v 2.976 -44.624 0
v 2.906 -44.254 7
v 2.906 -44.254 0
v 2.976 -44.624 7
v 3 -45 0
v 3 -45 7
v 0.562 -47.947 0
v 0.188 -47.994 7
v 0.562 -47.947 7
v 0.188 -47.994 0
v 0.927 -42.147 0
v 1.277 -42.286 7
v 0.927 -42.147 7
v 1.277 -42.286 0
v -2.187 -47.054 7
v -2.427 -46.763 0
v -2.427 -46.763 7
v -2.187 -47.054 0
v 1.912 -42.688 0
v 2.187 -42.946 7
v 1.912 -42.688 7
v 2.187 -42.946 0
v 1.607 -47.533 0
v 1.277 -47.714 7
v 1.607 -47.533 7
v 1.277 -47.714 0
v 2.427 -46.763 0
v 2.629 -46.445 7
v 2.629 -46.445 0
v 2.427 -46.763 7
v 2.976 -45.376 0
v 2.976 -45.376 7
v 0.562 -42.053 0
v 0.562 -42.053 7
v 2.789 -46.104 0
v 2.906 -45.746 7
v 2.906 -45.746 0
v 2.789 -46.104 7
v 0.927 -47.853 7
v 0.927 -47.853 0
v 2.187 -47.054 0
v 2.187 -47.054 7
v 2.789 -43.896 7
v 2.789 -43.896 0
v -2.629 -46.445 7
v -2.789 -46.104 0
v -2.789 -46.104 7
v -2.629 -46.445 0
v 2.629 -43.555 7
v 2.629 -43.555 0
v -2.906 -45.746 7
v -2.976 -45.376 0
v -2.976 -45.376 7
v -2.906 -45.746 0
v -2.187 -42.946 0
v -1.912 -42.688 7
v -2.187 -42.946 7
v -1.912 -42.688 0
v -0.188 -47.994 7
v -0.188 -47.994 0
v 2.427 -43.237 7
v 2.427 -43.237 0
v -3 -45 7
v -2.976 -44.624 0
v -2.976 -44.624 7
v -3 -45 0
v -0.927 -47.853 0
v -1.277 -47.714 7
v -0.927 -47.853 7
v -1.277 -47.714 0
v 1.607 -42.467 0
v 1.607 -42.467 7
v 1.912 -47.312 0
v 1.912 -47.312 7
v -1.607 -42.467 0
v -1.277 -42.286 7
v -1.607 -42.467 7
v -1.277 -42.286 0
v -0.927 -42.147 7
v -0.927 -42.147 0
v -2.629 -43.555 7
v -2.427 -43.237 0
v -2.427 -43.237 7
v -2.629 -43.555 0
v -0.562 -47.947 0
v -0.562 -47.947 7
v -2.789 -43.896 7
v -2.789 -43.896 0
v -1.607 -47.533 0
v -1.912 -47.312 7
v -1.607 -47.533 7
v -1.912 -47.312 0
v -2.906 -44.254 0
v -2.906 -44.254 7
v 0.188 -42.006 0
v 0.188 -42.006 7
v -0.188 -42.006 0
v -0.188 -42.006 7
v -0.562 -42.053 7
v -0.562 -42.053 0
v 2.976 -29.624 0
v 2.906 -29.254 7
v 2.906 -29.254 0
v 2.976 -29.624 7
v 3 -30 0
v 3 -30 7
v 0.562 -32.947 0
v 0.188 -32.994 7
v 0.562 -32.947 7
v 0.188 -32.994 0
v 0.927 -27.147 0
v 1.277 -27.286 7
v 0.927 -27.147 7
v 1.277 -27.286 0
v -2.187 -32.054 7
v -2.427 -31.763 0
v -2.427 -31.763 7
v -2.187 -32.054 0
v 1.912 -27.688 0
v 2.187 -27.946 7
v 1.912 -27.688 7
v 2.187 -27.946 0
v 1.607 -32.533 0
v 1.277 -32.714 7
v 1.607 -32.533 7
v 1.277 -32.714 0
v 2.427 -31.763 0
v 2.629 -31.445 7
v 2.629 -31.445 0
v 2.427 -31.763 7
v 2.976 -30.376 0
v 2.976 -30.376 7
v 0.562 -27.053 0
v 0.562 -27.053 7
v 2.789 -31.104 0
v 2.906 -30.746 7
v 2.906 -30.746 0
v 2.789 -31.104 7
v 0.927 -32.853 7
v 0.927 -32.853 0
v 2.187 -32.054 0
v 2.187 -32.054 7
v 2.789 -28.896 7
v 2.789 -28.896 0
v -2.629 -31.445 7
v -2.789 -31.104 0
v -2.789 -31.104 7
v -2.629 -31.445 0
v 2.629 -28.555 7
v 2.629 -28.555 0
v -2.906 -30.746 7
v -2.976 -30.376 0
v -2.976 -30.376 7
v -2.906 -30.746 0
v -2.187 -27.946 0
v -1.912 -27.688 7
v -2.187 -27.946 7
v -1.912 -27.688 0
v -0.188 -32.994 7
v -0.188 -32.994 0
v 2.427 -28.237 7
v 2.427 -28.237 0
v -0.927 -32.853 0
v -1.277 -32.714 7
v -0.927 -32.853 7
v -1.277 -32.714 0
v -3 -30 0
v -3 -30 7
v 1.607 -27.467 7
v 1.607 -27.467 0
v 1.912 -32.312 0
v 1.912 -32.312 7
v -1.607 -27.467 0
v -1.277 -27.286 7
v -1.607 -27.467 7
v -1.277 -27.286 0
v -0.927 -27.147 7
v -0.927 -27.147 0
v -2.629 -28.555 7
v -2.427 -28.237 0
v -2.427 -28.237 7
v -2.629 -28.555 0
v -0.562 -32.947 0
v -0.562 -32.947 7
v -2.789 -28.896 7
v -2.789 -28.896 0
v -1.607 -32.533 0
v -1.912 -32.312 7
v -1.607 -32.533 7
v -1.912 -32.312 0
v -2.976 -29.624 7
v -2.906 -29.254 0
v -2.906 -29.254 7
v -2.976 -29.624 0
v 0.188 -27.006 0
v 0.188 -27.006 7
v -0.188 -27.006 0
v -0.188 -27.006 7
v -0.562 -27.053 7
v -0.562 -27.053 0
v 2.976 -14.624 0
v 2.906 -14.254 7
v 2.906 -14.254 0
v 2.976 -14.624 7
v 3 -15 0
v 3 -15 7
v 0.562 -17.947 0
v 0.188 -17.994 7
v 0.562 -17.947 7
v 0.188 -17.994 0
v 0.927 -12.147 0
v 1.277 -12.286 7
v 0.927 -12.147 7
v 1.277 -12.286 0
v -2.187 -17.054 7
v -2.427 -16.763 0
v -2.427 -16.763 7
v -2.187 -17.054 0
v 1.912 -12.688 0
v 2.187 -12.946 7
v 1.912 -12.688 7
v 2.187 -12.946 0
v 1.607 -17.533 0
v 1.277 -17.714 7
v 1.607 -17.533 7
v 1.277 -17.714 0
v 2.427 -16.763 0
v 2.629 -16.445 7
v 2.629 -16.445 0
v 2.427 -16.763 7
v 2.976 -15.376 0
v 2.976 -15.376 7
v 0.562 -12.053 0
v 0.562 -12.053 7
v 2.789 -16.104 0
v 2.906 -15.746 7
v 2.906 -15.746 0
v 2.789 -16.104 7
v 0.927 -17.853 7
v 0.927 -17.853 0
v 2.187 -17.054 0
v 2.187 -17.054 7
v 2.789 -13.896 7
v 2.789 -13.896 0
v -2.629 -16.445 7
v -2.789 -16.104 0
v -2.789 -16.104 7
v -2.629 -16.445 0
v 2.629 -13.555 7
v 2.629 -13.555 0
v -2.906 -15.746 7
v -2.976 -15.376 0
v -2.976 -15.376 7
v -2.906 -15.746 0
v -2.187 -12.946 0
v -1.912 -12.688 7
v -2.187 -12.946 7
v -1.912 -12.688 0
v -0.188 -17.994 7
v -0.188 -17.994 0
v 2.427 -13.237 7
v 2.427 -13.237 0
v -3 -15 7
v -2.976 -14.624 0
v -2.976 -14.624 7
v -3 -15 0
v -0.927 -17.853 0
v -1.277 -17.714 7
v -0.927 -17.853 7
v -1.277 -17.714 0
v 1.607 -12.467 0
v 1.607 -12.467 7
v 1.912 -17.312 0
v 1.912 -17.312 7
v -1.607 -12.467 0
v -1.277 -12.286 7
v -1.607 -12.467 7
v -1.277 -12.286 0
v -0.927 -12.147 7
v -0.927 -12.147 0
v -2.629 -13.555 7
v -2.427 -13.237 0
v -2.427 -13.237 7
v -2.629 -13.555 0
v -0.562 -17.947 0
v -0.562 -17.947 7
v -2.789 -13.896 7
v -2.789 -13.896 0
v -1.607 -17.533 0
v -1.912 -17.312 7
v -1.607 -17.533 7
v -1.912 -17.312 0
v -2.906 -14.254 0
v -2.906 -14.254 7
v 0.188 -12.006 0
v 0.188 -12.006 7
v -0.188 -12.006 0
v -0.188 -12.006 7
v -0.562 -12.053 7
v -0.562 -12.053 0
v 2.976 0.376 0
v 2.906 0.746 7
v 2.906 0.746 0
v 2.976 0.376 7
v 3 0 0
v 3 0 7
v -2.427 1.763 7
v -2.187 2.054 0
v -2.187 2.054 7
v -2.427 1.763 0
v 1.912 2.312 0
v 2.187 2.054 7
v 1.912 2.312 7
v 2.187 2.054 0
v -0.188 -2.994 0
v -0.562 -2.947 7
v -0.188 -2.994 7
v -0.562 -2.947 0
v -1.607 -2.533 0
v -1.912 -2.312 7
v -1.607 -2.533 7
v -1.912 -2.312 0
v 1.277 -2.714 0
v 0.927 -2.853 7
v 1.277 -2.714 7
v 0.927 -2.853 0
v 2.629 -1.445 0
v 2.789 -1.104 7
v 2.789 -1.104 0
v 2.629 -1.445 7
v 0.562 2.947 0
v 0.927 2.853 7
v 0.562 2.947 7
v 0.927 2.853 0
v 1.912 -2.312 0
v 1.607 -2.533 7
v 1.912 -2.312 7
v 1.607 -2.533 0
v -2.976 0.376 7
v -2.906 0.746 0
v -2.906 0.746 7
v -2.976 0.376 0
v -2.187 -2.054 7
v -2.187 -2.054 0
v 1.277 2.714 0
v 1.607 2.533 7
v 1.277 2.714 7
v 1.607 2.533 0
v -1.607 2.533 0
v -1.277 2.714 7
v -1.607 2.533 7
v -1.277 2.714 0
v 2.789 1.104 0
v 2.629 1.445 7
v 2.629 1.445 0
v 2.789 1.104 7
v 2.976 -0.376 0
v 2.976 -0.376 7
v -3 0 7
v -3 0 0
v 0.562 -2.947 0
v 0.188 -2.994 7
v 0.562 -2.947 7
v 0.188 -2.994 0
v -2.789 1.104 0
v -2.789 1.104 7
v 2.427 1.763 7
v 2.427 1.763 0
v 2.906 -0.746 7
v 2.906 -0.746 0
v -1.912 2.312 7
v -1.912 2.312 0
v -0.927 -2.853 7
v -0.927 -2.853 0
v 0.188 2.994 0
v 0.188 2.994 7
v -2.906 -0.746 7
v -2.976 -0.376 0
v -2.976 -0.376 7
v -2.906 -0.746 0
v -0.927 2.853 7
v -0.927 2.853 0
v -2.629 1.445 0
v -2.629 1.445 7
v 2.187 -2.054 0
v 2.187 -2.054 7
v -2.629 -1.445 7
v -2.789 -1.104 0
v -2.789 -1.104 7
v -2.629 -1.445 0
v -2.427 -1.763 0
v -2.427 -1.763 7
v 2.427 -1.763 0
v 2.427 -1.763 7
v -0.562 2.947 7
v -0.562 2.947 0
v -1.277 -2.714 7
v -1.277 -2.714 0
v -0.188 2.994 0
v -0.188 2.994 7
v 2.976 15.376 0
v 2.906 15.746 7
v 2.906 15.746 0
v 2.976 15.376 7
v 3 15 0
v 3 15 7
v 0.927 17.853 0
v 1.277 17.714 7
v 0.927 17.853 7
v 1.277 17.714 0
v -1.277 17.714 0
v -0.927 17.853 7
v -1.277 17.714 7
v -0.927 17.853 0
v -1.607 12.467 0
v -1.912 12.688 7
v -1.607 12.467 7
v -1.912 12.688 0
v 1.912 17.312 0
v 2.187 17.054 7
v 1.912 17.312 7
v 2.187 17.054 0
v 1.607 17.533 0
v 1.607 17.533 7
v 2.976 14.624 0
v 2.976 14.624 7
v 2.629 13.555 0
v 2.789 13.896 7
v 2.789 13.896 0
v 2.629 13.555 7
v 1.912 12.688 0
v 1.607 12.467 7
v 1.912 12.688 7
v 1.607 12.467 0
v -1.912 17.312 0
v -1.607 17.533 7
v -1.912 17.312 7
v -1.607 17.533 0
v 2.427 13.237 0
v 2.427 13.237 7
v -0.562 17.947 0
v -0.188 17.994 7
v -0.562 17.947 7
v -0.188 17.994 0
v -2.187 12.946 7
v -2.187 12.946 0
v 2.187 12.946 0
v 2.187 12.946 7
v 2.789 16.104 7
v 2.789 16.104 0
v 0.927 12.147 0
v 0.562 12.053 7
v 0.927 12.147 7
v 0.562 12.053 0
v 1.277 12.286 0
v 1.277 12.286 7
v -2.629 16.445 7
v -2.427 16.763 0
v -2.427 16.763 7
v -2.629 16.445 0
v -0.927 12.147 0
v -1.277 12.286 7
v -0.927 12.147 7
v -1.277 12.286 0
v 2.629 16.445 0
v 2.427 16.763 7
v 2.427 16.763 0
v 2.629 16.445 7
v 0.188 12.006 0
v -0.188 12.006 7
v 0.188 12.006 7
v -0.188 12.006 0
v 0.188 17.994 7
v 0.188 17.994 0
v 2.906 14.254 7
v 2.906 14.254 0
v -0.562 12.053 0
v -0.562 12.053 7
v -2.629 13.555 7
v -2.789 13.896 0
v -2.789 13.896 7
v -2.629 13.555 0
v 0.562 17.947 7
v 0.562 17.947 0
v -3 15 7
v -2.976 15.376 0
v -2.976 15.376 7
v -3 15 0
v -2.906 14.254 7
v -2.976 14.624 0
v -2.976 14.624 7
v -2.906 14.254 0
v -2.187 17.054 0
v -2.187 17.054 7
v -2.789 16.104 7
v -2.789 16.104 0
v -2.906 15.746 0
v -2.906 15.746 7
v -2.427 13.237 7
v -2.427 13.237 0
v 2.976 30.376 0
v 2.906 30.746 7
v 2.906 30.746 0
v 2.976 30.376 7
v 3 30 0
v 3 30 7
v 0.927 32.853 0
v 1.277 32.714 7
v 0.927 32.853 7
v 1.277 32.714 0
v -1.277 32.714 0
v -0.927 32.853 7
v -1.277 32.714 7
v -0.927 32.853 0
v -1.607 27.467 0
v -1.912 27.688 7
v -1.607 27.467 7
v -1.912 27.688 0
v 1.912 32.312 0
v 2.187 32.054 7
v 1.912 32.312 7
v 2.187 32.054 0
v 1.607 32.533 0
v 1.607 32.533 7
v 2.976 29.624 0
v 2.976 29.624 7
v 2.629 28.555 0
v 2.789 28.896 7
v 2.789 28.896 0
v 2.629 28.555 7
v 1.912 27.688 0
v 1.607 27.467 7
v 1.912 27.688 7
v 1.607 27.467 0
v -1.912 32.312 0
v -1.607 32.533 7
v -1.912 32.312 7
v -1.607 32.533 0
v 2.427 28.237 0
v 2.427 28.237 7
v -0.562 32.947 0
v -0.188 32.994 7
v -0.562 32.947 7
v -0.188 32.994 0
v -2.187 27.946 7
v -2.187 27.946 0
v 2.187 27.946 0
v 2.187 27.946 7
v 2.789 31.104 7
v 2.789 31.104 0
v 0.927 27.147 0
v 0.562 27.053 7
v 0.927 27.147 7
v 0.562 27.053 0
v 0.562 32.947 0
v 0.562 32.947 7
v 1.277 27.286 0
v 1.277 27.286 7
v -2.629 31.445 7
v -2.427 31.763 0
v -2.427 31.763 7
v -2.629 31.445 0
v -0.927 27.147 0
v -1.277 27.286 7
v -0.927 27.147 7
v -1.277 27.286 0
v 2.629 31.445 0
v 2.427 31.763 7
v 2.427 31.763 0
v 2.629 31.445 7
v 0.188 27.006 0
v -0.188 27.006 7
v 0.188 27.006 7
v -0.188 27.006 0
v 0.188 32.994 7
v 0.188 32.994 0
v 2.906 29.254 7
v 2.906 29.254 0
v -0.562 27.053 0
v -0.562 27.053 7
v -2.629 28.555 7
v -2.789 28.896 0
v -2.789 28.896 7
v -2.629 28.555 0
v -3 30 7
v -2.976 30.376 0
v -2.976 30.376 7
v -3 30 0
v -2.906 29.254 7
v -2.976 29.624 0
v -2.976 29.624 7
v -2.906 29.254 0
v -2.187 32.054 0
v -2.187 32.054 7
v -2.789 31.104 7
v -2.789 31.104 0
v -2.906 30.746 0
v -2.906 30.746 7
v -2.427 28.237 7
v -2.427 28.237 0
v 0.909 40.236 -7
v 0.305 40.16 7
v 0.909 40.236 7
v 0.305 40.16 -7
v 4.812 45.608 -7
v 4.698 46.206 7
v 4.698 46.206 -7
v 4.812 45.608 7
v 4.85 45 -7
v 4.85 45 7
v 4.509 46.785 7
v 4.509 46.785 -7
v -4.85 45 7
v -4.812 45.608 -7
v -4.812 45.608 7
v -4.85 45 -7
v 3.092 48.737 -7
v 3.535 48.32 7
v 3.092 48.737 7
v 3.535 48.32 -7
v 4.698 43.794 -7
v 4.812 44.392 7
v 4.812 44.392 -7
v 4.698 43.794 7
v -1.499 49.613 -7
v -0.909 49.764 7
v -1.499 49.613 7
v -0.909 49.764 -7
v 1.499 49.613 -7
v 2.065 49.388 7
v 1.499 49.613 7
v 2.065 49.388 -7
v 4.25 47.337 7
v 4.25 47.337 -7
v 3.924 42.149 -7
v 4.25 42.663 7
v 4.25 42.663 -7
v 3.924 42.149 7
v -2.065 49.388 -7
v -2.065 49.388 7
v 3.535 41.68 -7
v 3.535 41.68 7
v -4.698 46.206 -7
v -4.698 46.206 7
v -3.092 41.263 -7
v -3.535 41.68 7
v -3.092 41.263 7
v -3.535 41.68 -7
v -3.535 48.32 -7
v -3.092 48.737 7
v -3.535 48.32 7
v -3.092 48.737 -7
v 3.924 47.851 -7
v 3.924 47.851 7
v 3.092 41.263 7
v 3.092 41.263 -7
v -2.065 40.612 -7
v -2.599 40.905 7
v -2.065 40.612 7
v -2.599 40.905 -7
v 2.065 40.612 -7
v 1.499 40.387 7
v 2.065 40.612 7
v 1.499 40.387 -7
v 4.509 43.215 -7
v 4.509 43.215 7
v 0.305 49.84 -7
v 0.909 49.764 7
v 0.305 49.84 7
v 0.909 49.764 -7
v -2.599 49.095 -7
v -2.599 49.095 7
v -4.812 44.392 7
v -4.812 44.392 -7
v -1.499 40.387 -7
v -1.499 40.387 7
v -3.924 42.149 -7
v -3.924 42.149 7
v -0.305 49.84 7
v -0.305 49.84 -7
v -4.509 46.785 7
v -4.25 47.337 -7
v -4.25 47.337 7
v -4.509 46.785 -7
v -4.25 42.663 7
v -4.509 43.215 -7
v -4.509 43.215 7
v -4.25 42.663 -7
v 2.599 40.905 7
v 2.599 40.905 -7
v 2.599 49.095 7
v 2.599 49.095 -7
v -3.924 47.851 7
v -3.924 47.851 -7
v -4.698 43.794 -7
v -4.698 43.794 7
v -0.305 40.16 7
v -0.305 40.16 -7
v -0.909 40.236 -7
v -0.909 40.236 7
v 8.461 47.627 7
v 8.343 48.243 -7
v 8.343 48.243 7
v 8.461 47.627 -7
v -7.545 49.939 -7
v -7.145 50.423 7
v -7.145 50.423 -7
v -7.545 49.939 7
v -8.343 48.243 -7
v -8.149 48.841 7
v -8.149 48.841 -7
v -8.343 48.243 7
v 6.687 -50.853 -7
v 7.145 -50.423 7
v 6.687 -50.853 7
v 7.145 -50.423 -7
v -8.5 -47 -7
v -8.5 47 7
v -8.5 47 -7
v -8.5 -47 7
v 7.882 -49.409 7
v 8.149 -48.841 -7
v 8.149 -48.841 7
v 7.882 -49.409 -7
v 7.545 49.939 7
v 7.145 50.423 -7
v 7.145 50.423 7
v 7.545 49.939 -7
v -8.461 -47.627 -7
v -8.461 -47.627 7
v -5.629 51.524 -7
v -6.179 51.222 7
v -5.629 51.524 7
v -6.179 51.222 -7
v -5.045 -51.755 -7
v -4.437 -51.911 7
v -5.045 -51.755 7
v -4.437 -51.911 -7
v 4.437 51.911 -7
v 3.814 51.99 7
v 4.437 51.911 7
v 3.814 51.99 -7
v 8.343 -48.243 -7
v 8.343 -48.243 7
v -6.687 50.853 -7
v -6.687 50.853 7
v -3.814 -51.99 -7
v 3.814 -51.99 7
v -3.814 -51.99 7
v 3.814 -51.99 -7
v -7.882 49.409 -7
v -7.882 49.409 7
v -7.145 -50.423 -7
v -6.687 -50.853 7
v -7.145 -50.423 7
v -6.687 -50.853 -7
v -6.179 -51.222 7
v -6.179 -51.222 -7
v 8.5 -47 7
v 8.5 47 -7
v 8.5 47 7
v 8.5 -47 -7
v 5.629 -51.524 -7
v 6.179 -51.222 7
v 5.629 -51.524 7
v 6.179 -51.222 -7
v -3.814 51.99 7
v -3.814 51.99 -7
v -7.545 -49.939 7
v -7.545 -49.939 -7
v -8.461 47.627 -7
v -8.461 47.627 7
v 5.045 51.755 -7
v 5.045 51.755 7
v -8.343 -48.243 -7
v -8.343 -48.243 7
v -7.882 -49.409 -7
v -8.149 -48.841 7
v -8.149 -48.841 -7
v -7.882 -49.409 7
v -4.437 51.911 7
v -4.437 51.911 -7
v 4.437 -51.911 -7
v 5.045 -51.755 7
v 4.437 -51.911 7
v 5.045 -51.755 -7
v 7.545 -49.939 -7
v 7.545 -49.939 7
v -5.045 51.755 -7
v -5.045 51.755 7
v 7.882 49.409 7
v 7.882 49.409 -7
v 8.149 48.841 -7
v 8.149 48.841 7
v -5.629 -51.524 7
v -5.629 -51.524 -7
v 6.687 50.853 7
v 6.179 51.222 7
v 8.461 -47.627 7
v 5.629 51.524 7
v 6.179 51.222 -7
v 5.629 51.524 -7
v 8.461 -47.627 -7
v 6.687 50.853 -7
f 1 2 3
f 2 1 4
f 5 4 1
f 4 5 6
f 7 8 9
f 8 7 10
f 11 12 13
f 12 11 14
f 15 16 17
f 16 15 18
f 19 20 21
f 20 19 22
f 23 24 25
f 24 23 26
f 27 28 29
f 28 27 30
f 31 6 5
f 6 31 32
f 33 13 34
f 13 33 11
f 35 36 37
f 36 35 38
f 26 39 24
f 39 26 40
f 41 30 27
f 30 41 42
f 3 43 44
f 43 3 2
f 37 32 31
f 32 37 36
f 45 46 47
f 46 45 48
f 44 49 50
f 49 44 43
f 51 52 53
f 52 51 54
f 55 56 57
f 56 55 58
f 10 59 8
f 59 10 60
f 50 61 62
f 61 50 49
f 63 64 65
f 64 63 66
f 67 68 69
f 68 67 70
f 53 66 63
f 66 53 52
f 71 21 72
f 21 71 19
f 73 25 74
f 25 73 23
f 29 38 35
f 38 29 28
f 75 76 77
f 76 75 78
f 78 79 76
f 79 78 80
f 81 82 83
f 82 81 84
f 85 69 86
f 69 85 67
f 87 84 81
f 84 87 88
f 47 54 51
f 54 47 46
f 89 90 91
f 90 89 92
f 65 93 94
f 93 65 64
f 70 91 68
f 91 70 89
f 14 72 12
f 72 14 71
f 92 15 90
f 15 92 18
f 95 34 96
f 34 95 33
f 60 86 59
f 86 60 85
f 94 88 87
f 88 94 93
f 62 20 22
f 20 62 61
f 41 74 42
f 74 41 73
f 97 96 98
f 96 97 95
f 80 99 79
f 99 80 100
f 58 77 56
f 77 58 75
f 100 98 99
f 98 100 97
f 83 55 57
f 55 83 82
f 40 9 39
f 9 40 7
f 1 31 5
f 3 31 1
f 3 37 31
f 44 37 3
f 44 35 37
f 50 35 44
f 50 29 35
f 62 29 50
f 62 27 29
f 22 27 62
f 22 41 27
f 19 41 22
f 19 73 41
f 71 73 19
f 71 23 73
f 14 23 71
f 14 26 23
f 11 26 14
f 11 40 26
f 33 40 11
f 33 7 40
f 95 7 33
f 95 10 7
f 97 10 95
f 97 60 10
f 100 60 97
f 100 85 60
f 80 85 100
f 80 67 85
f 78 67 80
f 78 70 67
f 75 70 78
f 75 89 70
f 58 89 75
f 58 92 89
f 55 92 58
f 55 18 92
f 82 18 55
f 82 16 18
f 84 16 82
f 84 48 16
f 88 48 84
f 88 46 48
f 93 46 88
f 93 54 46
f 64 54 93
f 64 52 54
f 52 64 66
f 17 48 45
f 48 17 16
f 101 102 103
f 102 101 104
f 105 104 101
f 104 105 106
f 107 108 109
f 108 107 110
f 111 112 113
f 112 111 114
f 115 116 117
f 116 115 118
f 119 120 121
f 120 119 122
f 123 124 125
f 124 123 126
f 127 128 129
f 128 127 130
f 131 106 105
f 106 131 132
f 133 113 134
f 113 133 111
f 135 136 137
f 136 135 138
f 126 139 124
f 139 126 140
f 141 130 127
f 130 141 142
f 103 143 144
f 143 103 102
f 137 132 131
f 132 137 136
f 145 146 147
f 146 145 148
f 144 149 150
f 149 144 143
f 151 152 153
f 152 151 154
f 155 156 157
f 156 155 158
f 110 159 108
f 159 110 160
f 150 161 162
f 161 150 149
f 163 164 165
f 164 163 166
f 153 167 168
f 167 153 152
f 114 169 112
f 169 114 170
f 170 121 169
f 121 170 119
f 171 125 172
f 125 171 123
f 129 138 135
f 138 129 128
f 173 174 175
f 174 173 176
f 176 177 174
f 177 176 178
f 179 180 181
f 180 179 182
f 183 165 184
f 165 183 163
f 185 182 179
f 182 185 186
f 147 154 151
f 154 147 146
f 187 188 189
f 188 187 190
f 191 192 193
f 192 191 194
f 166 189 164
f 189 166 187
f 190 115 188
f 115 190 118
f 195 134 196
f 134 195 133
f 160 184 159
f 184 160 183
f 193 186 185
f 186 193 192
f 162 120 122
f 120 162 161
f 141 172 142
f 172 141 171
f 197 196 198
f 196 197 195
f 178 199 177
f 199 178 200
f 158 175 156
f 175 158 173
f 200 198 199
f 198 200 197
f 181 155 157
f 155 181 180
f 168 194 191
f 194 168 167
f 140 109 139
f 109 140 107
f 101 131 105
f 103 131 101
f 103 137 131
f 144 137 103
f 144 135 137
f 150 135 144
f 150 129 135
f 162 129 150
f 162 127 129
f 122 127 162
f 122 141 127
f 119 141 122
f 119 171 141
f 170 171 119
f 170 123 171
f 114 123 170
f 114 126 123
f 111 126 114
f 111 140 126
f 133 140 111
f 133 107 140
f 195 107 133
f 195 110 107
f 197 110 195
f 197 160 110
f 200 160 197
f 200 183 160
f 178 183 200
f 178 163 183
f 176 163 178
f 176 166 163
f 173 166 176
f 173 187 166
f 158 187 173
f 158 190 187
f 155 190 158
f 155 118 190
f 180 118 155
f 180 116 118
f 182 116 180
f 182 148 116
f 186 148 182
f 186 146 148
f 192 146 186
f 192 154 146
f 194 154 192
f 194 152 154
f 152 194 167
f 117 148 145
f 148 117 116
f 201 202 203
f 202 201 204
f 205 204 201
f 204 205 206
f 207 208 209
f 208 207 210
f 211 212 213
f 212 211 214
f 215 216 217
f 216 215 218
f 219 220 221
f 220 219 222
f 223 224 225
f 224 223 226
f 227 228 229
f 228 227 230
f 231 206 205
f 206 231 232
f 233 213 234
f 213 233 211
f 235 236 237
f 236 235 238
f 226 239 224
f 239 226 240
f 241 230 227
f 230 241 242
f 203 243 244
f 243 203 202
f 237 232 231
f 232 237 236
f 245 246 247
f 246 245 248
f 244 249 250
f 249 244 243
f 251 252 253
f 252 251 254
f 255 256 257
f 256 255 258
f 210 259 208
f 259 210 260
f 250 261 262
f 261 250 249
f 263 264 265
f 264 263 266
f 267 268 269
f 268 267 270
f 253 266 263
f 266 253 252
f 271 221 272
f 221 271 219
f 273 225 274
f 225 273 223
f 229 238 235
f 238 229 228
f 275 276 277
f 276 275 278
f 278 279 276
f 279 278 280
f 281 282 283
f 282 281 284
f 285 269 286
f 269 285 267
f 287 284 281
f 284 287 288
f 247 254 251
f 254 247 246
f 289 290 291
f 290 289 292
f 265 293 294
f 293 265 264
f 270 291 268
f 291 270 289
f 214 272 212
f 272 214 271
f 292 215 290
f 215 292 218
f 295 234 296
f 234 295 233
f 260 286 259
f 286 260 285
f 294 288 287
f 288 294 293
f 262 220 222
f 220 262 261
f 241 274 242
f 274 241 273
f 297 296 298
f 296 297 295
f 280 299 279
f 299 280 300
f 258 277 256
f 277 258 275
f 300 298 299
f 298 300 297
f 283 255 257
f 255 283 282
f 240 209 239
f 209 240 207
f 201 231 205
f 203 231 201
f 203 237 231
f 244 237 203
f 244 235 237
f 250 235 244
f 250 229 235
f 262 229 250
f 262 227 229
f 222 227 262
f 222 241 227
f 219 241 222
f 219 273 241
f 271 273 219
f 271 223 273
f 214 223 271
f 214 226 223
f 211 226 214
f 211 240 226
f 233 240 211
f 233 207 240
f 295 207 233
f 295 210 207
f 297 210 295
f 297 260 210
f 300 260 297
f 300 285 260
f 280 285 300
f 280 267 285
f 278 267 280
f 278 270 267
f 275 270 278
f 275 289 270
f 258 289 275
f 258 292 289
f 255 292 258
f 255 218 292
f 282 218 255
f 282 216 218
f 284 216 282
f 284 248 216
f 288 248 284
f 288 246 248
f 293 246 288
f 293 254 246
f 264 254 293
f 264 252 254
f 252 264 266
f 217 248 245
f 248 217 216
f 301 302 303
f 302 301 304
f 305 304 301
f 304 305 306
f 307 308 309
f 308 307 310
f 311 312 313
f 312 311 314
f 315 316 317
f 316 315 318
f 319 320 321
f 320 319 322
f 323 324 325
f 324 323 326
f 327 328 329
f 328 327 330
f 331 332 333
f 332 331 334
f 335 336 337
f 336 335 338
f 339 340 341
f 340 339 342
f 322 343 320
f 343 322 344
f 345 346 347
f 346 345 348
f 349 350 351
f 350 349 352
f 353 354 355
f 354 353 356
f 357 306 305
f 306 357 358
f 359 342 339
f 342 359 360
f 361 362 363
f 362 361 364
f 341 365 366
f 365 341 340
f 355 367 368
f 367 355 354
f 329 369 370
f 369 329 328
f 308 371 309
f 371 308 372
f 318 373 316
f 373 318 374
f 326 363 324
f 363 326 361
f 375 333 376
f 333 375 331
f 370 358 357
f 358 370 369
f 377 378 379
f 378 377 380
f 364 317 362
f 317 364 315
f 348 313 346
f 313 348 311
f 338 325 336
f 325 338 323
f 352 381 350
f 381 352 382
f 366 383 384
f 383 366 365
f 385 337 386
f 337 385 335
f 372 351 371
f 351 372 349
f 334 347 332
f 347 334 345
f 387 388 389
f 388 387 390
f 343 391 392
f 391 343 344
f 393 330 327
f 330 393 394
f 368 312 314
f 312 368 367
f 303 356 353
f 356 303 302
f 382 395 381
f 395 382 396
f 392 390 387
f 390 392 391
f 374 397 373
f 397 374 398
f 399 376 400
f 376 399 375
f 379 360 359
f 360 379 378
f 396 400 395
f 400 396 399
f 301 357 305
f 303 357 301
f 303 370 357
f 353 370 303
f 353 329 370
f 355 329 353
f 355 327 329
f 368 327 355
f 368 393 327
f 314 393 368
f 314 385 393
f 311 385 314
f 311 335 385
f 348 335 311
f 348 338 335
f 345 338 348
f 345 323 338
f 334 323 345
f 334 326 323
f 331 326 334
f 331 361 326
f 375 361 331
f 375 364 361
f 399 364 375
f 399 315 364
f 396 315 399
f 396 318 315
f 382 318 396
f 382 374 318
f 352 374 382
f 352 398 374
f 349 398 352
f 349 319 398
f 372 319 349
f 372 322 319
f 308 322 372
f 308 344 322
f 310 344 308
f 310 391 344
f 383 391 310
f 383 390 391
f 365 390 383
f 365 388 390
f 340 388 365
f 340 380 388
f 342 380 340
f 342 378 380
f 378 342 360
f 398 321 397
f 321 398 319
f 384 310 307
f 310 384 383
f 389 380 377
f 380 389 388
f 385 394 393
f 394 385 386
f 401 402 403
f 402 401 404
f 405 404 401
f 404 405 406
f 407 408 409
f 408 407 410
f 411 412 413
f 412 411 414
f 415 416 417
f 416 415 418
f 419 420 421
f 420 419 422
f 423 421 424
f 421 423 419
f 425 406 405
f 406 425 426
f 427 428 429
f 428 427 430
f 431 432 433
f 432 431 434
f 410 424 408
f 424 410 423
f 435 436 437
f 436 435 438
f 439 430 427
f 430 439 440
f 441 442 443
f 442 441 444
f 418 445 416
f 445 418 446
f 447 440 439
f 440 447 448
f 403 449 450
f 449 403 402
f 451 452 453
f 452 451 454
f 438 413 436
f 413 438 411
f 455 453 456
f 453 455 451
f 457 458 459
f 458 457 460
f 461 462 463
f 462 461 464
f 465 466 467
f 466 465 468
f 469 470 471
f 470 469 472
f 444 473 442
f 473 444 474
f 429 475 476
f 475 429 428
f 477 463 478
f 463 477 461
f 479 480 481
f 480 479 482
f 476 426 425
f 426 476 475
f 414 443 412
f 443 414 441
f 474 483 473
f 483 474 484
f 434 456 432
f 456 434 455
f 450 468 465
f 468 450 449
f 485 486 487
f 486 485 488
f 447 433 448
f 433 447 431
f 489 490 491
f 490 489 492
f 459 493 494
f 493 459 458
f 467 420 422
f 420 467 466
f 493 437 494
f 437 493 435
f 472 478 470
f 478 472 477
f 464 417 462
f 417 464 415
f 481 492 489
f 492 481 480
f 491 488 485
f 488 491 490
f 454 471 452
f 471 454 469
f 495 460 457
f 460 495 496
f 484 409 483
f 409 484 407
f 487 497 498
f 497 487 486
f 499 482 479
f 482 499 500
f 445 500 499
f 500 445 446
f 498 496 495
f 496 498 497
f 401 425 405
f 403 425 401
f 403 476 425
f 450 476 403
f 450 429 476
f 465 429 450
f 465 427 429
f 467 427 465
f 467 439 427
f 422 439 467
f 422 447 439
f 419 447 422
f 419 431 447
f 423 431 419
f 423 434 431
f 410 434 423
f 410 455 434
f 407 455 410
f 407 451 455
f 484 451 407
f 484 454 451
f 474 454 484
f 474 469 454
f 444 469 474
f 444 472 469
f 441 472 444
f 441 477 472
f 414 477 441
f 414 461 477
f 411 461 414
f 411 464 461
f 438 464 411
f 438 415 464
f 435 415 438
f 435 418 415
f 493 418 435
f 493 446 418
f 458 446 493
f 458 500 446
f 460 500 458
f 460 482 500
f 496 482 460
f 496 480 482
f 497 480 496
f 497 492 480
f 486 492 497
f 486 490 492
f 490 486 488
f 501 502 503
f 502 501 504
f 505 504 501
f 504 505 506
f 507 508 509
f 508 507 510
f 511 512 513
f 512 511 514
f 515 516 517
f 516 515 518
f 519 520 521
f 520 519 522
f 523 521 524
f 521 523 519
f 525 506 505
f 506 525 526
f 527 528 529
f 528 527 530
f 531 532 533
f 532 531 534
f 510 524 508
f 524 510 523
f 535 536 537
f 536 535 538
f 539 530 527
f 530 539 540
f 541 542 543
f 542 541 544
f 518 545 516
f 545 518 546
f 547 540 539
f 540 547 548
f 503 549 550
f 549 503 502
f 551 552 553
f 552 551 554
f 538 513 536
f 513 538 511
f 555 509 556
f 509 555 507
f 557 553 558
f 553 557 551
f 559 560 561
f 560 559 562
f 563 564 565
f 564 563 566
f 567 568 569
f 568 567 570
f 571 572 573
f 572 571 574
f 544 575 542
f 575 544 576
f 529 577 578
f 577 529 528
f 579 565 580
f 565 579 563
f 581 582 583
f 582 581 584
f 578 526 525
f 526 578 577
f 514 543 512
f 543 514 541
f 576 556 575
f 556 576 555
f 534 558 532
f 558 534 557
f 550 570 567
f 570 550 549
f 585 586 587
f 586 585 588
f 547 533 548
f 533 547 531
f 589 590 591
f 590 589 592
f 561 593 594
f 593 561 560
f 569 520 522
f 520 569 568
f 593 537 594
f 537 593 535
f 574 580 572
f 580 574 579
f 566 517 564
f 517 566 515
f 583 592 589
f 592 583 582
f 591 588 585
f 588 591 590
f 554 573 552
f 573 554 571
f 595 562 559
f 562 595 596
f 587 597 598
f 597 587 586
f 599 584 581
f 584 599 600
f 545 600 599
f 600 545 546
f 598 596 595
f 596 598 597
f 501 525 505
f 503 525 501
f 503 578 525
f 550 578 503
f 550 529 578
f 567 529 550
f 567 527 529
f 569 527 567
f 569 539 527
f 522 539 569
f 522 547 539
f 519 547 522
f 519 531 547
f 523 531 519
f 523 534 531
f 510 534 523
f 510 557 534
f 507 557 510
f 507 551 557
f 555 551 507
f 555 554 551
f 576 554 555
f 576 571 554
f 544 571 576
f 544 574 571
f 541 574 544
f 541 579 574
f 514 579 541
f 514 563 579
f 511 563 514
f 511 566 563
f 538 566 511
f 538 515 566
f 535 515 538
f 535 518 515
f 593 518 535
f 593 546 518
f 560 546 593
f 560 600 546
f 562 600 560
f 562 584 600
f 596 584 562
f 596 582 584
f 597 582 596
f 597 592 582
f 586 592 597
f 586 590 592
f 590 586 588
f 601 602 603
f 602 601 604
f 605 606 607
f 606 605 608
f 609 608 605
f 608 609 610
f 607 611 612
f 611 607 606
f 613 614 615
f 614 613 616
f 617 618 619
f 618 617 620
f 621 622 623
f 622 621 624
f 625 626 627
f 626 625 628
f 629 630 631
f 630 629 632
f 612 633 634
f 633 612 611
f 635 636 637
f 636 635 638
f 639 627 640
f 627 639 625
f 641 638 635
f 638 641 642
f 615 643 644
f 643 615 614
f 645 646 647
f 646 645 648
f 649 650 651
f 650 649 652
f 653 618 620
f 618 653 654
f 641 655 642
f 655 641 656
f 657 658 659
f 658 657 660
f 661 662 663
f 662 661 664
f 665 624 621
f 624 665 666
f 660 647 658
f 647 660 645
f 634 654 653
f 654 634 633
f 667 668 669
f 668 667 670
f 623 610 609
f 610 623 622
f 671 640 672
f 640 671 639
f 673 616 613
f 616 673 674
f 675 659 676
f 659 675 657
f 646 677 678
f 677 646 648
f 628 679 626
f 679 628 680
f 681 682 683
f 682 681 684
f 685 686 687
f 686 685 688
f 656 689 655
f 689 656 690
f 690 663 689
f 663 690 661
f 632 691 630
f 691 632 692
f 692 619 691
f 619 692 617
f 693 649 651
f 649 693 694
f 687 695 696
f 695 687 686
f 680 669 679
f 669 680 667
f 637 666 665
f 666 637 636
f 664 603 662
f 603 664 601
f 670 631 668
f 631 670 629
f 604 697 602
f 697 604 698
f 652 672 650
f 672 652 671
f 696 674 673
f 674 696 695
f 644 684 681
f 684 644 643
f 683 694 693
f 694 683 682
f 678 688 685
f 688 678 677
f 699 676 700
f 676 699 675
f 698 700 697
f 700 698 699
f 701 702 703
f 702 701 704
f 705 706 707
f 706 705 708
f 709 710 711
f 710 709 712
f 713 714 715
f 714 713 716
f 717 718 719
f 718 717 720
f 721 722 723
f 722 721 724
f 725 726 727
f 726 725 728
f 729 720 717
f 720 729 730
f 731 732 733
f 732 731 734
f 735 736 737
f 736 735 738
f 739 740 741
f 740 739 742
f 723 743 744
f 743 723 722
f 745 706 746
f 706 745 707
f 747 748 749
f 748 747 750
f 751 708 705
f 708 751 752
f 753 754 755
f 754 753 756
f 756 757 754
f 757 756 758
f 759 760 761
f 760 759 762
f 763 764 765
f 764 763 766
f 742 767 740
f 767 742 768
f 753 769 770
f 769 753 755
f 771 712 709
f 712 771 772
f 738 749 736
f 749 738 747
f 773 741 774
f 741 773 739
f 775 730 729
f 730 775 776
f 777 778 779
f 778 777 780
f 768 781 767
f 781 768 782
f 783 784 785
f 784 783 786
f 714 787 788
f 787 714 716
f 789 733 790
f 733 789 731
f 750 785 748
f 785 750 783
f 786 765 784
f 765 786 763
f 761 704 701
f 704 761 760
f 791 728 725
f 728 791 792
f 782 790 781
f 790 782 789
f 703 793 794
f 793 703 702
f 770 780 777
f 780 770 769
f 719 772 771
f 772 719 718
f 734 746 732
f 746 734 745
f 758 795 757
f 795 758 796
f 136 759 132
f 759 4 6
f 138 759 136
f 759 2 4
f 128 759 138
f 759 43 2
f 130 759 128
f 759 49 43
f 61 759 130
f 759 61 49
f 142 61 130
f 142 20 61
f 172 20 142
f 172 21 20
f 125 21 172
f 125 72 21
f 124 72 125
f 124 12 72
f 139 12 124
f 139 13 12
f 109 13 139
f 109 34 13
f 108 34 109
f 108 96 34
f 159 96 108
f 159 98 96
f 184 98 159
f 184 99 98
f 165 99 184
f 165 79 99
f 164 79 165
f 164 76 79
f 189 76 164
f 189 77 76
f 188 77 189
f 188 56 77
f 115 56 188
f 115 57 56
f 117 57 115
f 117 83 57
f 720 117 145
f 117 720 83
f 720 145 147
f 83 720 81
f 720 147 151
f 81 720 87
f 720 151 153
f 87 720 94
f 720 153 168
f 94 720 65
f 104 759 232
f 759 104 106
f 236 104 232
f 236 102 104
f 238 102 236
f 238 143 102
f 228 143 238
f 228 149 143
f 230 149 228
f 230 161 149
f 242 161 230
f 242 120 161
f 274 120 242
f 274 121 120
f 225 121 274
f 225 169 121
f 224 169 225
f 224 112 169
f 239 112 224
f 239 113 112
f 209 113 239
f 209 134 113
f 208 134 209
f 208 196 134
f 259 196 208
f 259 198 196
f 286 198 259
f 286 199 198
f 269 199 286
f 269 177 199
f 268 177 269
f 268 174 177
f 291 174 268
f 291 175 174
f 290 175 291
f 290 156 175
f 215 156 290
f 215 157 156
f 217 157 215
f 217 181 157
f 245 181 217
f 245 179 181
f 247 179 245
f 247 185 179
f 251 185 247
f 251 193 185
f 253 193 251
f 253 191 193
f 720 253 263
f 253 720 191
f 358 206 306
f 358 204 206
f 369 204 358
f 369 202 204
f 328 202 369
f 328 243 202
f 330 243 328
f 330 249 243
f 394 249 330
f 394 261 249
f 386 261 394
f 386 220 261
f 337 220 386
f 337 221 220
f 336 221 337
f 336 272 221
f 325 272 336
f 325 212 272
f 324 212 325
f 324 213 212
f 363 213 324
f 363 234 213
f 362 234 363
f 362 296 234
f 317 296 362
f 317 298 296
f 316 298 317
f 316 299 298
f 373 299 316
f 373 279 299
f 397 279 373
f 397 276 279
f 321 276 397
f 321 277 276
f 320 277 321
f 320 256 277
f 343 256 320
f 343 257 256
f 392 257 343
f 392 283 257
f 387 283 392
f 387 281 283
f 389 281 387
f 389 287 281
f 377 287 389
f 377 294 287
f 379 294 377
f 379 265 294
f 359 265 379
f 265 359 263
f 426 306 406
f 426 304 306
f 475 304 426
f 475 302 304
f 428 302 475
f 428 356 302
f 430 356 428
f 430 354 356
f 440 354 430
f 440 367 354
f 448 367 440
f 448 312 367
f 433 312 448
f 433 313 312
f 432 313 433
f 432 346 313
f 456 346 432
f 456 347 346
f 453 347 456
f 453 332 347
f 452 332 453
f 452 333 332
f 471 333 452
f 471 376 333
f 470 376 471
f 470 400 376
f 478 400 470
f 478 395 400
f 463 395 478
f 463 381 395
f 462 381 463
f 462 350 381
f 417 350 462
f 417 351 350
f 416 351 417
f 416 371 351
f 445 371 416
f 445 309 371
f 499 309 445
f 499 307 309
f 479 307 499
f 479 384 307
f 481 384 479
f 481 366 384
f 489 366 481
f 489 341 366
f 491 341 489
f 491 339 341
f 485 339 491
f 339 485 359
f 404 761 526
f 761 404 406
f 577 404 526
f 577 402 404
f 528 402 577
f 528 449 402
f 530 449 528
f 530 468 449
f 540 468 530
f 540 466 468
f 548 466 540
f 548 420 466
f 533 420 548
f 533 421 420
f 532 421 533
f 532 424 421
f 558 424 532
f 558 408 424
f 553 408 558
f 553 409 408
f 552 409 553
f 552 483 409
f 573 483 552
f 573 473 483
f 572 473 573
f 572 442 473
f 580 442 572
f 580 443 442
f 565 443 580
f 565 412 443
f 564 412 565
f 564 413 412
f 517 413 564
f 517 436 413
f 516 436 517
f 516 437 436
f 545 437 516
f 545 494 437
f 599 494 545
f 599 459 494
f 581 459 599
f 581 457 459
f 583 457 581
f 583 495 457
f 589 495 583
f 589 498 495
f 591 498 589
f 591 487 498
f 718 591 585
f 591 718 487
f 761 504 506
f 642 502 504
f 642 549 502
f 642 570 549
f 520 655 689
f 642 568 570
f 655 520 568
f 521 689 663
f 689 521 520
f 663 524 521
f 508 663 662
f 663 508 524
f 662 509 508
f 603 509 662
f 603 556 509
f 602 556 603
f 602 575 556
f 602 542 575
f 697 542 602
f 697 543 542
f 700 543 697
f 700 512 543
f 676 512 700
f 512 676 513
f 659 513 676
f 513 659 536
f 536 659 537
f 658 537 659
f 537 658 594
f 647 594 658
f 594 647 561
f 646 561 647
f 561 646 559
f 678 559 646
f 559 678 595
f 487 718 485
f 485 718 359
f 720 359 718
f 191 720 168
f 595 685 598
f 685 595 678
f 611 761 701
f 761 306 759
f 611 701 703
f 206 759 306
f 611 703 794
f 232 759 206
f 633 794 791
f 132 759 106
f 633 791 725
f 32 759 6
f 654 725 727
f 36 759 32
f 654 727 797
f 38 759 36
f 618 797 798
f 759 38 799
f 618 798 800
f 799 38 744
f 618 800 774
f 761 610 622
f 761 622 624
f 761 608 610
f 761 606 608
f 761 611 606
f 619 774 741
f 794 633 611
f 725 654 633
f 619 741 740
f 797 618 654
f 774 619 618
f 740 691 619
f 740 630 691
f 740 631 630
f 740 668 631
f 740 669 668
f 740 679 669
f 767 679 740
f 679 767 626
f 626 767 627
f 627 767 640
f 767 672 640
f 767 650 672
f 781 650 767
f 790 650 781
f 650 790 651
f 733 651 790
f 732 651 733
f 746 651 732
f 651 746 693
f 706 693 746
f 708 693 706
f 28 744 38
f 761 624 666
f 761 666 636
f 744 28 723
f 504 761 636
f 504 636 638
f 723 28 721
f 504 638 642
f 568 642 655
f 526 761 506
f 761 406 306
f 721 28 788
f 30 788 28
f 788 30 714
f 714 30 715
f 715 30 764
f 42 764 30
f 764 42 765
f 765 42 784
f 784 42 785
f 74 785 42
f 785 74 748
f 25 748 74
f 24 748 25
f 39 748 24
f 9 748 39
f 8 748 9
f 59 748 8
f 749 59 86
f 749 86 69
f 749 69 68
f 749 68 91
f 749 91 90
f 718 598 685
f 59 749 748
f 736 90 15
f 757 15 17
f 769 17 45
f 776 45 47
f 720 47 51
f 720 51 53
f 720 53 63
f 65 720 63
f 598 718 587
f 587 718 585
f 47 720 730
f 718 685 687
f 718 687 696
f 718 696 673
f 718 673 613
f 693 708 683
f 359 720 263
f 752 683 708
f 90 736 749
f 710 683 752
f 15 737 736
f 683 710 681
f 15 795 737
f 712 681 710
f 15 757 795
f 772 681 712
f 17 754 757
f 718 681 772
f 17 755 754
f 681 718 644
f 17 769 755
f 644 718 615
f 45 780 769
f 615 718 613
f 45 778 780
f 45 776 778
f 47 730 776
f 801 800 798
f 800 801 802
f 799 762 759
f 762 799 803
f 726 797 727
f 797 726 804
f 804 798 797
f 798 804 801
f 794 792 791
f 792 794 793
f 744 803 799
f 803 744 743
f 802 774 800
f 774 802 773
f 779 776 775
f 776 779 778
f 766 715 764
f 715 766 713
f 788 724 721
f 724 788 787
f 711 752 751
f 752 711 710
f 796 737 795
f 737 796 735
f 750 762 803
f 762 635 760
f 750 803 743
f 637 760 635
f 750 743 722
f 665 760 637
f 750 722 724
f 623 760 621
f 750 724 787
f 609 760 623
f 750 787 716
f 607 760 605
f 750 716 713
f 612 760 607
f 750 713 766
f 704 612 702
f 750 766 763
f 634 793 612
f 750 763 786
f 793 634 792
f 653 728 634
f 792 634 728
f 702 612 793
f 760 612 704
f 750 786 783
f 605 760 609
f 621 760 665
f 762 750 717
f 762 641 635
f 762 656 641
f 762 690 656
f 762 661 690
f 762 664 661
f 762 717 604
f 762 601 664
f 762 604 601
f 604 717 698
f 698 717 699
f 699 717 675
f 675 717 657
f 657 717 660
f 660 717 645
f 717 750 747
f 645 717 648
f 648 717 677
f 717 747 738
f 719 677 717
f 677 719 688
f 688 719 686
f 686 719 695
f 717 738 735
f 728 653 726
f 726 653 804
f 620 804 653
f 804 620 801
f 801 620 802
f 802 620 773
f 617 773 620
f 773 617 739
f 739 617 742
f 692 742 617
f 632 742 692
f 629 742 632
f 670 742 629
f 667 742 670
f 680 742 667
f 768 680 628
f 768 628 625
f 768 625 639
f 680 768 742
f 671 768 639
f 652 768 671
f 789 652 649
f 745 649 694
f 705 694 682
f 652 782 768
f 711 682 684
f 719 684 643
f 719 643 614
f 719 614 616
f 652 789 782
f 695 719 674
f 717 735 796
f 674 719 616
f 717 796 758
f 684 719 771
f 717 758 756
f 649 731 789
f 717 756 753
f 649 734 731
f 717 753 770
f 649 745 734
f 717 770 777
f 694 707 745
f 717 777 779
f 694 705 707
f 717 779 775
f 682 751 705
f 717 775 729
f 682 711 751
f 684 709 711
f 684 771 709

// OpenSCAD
$fn = 50;


difference() {
	union() {
		translate(v = [0, 0, -7.0000000000]) {
			hull() {
				translate(v = [-3.5000000000, 47.0000000000, 0]) {
					cylinder(h = 14, r = 5);
				}
				translate(v = [3.5000000000, 47.0000000000, 0]) {
					cylinder(h = 14, r = 5);
				}
				translate(v = [-3.5000000000, -47.0000000000, 0]) {
					cylinder(h = 14, r = 5);
				}
				translate(v = [3.5000000000, -47.0000000000, 0]) {
					cylinder(h = 14, r = 5);
				}
			}
		}
	}
	union() {
		translate(v = [0.0000000000, -45.0000000000, 0]) {
			cylinder(h = 100, r = 3.0000000000);
		}
		translate(v = [0.0000000000, -30.0000000000, 0]) {
			cylinder(h = 100, r = 3.0000000000);
		}
		translate(v = [0.0000000000, -15.0000000000, 0]) {
			cylinder(h = 100, r = 3.0000000000);
		}
		cylinder(h = 100, r = 3.0000000000);
		translate(v = [0.0000000000, 15.0000000000, 0]) {
			cylinder(h = 100, r = 3.0000000000);
		}
		translate(v = [0.0000000000, 30.0000000000, 0]) {
			cylinder(h = 100, r = 3.0000000000);
		}
		translate(v = [0, 45, -100.0000000000]) {
			cylinder(h = 200, r = 4.8500000000);
		}
	}
}
